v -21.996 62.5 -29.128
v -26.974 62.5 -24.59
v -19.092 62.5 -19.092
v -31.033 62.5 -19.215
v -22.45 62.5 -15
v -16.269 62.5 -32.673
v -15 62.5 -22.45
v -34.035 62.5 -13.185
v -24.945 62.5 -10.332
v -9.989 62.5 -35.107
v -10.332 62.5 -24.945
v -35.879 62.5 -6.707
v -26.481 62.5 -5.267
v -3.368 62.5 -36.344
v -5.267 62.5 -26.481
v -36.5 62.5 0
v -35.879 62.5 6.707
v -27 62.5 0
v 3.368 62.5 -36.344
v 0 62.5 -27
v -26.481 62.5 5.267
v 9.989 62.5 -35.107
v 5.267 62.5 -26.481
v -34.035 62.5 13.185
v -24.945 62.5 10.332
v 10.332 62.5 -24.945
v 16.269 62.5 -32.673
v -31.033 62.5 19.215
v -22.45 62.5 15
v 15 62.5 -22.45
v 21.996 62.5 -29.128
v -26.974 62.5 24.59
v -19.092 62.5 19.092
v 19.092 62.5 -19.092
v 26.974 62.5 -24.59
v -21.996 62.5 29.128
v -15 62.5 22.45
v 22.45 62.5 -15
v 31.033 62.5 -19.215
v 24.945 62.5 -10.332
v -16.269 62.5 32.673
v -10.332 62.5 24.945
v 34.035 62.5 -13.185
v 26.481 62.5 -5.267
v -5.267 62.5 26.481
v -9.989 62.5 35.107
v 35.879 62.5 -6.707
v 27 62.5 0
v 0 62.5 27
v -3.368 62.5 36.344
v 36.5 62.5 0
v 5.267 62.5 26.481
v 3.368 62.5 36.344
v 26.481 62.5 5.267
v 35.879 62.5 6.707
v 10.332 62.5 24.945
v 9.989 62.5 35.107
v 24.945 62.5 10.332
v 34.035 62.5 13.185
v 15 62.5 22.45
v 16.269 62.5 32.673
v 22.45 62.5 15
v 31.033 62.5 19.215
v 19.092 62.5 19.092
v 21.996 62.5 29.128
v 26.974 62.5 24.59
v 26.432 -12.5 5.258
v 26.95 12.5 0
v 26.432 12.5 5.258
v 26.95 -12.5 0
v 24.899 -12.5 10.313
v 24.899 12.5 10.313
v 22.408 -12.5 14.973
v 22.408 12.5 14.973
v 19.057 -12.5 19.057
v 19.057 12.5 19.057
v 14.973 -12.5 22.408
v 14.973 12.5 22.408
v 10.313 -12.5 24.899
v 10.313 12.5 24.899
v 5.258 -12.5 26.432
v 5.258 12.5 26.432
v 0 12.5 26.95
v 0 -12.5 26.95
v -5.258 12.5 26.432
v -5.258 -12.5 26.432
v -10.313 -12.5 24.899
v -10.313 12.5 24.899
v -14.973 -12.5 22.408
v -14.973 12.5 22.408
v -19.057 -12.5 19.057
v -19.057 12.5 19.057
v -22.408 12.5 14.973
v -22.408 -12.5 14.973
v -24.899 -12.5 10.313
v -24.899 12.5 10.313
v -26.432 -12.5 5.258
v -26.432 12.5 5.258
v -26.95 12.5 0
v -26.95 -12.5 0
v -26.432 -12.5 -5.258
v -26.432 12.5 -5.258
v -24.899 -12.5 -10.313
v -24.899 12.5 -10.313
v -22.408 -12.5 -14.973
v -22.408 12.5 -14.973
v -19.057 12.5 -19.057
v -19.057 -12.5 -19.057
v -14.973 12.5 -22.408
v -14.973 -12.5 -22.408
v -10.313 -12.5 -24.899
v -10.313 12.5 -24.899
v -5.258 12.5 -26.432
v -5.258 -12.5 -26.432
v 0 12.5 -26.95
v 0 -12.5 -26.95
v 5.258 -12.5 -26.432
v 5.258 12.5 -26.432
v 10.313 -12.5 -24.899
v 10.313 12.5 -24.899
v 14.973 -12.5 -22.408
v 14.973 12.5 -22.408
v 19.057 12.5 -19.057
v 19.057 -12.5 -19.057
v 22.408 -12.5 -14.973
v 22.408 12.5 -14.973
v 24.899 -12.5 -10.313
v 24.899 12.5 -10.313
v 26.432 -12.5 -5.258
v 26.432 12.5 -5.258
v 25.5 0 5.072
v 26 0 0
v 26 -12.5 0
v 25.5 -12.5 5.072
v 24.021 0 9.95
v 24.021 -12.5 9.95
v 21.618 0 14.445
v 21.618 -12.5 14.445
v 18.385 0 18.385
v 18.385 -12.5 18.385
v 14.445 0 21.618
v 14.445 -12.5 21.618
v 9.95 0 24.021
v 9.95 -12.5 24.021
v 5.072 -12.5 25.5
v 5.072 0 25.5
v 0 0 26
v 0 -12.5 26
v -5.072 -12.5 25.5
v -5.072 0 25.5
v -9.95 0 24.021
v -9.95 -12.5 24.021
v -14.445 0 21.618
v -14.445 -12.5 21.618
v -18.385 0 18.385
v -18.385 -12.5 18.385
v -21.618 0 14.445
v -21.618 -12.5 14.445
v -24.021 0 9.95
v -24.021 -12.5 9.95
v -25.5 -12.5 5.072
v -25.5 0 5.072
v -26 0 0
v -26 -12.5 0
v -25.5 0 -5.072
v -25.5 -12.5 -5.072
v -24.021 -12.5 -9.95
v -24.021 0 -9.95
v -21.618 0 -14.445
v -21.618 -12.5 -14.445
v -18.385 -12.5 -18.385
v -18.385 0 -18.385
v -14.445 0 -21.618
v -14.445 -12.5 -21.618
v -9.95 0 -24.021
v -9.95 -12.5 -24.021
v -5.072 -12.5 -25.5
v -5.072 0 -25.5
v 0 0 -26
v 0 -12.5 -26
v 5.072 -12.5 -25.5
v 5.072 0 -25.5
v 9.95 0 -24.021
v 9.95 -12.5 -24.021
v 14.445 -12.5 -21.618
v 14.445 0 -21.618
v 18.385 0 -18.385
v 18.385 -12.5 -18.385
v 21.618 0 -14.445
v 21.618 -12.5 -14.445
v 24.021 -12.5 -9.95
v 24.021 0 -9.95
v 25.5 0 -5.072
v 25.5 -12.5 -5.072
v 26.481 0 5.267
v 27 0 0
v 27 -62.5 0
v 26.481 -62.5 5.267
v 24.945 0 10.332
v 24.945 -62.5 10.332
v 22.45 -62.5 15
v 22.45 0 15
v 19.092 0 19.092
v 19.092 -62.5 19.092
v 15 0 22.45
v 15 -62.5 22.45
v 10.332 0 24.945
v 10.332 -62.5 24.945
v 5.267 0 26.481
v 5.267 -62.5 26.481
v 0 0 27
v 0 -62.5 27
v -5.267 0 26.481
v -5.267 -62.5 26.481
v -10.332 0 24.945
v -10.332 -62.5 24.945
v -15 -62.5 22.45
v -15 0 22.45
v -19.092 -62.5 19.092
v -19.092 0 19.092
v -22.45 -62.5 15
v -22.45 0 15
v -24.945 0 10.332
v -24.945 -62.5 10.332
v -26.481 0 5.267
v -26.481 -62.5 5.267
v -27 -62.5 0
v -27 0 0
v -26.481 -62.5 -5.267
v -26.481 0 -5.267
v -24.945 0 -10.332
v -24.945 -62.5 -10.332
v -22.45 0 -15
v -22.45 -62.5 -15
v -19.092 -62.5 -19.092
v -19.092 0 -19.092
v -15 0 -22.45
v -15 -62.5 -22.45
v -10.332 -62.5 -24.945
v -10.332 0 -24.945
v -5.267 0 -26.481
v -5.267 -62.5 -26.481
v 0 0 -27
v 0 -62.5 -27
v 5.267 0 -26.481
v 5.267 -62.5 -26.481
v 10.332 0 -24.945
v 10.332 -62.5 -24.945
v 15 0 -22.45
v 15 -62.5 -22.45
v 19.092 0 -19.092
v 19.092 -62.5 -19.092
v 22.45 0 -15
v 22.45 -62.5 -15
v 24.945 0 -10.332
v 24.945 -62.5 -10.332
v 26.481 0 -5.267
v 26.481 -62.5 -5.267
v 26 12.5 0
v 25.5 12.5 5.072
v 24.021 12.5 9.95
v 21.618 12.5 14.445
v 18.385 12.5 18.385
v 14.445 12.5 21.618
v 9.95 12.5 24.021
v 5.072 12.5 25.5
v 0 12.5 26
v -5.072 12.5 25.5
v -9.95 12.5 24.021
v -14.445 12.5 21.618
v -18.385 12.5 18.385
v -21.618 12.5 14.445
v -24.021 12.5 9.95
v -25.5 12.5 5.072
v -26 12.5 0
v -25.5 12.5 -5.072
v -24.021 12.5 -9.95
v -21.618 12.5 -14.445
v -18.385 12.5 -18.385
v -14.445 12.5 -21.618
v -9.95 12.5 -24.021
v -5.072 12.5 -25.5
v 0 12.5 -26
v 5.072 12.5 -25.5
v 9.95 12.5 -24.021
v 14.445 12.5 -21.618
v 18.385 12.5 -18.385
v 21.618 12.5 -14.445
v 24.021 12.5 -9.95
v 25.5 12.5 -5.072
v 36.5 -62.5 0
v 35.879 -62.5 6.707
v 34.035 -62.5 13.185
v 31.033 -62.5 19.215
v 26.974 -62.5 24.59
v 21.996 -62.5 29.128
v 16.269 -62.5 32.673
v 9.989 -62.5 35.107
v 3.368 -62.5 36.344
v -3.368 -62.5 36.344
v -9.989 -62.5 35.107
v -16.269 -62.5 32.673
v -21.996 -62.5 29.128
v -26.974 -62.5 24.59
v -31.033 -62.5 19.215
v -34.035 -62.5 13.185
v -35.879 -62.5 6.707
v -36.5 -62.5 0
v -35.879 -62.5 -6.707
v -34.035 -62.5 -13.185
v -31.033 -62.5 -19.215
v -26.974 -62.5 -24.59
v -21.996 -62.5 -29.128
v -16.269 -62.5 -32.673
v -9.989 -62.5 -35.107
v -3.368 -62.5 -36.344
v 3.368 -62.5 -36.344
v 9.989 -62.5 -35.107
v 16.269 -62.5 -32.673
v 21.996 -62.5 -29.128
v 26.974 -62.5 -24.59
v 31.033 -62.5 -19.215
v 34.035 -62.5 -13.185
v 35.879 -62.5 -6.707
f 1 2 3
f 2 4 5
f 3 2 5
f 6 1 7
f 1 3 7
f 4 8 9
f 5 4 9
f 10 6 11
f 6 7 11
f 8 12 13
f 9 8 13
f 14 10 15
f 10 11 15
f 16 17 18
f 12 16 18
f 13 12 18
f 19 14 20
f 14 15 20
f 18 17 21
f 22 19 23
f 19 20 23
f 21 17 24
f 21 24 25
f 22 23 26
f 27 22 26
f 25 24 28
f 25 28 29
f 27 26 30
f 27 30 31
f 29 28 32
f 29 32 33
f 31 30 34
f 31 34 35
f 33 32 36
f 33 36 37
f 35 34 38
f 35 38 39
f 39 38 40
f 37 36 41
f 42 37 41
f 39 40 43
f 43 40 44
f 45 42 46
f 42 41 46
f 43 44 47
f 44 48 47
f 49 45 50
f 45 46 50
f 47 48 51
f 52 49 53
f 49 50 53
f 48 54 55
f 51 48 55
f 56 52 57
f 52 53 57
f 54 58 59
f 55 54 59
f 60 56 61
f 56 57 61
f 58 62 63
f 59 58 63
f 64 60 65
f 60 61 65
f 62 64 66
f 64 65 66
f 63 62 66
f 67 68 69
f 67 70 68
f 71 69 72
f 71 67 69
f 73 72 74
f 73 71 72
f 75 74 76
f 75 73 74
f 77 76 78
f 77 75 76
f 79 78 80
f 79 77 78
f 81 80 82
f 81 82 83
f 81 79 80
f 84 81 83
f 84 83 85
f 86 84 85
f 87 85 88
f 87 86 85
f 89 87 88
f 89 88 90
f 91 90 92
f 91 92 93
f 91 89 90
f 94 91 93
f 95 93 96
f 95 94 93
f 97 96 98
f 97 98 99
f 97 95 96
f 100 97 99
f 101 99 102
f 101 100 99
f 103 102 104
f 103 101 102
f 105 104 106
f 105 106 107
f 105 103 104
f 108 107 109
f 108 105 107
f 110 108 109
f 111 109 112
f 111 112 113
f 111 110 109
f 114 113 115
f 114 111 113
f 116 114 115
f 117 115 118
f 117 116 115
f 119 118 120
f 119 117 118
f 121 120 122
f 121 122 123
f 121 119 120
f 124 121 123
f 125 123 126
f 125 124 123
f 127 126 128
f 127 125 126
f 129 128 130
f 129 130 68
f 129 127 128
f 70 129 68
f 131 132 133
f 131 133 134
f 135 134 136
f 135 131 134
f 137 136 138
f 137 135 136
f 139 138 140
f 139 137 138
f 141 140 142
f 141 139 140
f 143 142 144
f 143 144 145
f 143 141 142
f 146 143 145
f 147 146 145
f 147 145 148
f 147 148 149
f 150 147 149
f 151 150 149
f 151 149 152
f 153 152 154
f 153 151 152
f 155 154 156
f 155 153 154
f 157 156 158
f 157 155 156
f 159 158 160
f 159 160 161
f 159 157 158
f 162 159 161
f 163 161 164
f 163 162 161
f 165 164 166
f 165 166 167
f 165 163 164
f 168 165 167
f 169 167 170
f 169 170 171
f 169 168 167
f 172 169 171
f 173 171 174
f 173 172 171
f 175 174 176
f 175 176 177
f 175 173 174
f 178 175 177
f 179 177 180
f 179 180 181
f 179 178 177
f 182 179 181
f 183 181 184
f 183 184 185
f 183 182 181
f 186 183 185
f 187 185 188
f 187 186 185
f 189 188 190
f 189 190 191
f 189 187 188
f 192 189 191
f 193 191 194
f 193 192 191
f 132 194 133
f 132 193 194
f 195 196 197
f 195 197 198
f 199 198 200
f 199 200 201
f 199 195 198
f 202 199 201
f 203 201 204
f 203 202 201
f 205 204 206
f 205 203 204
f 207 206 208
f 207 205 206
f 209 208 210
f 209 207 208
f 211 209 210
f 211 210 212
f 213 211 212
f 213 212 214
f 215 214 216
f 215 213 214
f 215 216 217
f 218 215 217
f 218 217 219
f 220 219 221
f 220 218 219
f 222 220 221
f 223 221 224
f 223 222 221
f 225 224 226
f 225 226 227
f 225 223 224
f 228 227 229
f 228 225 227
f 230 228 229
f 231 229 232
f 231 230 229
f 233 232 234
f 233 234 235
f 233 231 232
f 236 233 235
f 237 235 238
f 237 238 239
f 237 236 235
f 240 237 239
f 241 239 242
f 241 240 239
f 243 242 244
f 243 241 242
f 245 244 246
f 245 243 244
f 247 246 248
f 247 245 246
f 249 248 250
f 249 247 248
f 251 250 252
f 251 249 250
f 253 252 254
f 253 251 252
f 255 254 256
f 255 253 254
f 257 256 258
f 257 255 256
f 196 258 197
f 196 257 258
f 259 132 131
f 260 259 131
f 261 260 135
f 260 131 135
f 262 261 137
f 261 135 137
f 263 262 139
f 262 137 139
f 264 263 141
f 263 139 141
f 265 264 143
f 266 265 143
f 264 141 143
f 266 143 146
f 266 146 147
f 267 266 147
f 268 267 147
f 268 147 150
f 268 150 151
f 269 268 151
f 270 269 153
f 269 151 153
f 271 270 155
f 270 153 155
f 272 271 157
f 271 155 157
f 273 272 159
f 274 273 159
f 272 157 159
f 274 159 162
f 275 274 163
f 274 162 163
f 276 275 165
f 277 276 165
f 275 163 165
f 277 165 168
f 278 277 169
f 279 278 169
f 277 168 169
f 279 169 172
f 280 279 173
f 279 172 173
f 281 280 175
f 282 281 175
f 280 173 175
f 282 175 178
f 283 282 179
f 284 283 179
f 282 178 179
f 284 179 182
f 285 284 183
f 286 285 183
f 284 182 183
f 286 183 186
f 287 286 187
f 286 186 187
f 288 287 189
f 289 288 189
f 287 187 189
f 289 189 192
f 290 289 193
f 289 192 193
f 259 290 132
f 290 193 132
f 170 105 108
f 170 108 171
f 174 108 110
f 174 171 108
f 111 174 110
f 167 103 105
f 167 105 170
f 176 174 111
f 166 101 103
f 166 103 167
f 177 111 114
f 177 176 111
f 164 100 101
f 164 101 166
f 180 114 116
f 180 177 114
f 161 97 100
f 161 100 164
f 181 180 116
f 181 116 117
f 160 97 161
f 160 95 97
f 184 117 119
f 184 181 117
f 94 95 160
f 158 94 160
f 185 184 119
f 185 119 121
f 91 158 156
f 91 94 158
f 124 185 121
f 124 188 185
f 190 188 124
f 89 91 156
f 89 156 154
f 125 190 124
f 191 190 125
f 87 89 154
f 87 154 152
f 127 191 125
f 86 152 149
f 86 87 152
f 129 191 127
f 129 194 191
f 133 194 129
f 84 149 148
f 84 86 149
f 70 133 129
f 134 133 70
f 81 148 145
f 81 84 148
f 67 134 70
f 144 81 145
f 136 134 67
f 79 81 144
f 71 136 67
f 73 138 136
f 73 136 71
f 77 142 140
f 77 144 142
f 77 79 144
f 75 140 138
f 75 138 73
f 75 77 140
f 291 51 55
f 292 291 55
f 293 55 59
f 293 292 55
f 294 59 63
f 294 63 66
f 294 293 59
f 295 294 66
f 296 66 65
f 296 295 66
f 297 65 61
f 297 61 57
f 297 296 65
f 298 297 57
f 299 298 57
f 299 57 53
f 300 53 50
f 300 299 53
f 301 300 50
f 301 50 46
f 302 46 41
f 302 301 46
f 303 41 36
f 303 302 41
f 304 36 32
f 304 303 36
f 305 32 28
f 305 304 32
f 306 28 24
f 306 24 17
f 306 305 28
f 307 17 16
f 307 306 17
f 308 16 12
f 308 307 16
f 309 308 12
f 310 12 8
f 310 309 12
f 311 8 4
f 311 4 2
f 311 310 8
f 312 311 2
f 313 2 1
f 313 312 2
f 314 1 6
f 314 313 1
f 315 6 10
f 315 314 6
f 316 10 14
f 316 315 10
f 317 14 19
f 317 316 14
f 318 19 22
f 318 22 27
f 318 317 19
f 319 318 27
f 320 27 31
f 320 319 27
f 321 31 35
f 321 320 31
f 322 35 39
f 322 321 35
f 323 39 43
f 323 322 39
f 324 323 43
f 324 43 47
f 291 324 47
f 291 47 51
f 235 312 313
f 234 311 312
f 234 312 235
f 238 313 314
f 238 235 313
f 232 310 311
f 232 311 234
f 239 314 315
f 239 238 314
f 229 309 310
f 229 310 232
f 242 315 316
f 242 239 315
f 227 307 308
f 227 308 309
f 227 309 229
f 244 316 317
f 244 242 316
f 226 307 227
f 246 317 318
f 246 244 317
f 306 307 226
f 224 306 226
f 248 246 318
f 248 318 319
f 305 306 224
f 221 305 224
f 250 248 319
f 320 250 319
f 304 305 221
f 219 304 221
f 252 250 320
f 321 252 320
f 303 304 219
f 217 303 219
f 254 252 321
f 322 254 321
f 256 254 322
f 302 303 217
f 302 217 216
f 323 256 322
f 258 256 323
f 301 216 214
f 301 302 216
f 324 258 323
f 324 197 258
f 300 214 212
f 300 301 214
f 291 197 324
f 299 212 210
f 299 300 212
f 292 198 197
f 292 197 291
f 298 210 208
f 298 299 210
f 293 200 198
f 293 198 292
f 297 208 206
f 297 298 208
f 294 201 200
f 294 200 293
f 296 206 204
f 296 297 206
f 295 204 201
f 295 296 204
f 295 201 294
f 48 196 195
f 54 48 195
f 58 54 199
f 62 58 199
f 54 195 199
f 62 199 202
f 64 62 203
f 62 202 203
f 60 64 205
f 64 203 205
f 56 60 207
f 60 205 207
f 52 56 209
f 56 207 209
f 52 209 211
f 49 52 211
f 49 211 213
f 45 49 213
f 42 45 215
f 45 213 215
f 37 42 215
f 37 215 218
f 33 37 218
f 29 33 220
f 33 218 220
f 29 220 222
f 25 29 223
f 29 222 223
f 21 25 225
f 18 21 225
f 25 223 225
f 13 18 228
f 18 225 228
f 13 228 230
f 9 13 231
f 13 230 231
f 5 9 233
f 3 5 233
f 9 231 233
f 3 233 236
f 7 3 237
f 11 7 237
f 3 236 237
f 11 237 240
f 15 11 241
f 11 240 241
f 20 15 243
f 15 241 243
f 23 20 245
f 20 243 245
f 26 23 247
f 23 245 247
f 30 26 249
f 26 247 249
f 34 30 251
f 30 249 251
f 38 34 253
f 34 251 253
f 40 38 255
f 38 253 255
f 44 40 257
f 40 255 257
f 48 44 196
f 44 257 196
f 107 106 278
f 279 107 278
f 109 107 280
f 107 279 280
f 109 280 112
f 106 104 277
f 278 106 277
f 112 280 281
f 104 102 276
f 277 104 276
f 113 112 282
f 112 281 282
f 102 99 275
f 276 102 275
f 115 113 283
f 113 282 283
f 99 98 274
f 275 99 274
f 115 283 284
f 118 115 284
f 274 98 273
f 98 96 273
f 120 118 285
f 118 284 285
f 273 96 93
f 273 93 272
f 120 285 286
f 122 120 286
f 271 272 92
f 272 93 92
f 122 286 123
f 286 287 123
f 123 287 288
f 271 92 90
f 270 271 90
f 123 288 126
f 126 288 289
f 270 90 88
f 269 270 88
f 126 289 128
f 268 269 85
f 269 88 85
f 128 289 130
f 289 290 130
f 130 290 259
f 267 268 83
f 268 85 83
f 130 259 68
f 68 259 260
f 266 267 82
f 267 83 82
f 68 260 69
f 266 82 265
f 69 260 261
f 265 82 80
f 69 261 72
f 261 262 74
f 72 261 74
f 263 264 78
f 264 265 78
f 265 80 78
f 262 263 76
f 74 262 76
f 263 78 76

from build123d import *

# Parameters (mm, degrees)
F0_R          = 36.5
F0_R_2        = 27
F1_DEPTH      = 62.5
F1_DEPTH_BACK = 62.5
F2_R          = 26.95
F2_R_2        = 26
F3_DEPTH      = 12.5
F3_DEPTH_BACK = 12.5


with BuildPart() as f1:
    # F0 (on Front) → F1 (new body, two sides)
    with BuildSketch(Plane.XZ) as f1_sk:
        Circle(F0_R)
        Circle(F0_R_2, mode=Mode.SUBTRACT)
    extrude(amount=F1_DEPTH)
    extrude(f1_sk.sketch, amount=-F1_DEPTH_BACK)


with BuildPart() as f3:
    # F2 (on Front) → F3 (new body, two sides)
    with BuildSketch(Plane.XZ) as f3_sk:
        Circle(F2_R)
        Circle(F2_R_2, mode=Mode.SUBTRACT)
    extrude(amount=F3_DEPTH)
    extrude(f3_sk.sketch, amount=-F3_DEPTH_BACK)


solid = Compound([f1.part, f3.part])
